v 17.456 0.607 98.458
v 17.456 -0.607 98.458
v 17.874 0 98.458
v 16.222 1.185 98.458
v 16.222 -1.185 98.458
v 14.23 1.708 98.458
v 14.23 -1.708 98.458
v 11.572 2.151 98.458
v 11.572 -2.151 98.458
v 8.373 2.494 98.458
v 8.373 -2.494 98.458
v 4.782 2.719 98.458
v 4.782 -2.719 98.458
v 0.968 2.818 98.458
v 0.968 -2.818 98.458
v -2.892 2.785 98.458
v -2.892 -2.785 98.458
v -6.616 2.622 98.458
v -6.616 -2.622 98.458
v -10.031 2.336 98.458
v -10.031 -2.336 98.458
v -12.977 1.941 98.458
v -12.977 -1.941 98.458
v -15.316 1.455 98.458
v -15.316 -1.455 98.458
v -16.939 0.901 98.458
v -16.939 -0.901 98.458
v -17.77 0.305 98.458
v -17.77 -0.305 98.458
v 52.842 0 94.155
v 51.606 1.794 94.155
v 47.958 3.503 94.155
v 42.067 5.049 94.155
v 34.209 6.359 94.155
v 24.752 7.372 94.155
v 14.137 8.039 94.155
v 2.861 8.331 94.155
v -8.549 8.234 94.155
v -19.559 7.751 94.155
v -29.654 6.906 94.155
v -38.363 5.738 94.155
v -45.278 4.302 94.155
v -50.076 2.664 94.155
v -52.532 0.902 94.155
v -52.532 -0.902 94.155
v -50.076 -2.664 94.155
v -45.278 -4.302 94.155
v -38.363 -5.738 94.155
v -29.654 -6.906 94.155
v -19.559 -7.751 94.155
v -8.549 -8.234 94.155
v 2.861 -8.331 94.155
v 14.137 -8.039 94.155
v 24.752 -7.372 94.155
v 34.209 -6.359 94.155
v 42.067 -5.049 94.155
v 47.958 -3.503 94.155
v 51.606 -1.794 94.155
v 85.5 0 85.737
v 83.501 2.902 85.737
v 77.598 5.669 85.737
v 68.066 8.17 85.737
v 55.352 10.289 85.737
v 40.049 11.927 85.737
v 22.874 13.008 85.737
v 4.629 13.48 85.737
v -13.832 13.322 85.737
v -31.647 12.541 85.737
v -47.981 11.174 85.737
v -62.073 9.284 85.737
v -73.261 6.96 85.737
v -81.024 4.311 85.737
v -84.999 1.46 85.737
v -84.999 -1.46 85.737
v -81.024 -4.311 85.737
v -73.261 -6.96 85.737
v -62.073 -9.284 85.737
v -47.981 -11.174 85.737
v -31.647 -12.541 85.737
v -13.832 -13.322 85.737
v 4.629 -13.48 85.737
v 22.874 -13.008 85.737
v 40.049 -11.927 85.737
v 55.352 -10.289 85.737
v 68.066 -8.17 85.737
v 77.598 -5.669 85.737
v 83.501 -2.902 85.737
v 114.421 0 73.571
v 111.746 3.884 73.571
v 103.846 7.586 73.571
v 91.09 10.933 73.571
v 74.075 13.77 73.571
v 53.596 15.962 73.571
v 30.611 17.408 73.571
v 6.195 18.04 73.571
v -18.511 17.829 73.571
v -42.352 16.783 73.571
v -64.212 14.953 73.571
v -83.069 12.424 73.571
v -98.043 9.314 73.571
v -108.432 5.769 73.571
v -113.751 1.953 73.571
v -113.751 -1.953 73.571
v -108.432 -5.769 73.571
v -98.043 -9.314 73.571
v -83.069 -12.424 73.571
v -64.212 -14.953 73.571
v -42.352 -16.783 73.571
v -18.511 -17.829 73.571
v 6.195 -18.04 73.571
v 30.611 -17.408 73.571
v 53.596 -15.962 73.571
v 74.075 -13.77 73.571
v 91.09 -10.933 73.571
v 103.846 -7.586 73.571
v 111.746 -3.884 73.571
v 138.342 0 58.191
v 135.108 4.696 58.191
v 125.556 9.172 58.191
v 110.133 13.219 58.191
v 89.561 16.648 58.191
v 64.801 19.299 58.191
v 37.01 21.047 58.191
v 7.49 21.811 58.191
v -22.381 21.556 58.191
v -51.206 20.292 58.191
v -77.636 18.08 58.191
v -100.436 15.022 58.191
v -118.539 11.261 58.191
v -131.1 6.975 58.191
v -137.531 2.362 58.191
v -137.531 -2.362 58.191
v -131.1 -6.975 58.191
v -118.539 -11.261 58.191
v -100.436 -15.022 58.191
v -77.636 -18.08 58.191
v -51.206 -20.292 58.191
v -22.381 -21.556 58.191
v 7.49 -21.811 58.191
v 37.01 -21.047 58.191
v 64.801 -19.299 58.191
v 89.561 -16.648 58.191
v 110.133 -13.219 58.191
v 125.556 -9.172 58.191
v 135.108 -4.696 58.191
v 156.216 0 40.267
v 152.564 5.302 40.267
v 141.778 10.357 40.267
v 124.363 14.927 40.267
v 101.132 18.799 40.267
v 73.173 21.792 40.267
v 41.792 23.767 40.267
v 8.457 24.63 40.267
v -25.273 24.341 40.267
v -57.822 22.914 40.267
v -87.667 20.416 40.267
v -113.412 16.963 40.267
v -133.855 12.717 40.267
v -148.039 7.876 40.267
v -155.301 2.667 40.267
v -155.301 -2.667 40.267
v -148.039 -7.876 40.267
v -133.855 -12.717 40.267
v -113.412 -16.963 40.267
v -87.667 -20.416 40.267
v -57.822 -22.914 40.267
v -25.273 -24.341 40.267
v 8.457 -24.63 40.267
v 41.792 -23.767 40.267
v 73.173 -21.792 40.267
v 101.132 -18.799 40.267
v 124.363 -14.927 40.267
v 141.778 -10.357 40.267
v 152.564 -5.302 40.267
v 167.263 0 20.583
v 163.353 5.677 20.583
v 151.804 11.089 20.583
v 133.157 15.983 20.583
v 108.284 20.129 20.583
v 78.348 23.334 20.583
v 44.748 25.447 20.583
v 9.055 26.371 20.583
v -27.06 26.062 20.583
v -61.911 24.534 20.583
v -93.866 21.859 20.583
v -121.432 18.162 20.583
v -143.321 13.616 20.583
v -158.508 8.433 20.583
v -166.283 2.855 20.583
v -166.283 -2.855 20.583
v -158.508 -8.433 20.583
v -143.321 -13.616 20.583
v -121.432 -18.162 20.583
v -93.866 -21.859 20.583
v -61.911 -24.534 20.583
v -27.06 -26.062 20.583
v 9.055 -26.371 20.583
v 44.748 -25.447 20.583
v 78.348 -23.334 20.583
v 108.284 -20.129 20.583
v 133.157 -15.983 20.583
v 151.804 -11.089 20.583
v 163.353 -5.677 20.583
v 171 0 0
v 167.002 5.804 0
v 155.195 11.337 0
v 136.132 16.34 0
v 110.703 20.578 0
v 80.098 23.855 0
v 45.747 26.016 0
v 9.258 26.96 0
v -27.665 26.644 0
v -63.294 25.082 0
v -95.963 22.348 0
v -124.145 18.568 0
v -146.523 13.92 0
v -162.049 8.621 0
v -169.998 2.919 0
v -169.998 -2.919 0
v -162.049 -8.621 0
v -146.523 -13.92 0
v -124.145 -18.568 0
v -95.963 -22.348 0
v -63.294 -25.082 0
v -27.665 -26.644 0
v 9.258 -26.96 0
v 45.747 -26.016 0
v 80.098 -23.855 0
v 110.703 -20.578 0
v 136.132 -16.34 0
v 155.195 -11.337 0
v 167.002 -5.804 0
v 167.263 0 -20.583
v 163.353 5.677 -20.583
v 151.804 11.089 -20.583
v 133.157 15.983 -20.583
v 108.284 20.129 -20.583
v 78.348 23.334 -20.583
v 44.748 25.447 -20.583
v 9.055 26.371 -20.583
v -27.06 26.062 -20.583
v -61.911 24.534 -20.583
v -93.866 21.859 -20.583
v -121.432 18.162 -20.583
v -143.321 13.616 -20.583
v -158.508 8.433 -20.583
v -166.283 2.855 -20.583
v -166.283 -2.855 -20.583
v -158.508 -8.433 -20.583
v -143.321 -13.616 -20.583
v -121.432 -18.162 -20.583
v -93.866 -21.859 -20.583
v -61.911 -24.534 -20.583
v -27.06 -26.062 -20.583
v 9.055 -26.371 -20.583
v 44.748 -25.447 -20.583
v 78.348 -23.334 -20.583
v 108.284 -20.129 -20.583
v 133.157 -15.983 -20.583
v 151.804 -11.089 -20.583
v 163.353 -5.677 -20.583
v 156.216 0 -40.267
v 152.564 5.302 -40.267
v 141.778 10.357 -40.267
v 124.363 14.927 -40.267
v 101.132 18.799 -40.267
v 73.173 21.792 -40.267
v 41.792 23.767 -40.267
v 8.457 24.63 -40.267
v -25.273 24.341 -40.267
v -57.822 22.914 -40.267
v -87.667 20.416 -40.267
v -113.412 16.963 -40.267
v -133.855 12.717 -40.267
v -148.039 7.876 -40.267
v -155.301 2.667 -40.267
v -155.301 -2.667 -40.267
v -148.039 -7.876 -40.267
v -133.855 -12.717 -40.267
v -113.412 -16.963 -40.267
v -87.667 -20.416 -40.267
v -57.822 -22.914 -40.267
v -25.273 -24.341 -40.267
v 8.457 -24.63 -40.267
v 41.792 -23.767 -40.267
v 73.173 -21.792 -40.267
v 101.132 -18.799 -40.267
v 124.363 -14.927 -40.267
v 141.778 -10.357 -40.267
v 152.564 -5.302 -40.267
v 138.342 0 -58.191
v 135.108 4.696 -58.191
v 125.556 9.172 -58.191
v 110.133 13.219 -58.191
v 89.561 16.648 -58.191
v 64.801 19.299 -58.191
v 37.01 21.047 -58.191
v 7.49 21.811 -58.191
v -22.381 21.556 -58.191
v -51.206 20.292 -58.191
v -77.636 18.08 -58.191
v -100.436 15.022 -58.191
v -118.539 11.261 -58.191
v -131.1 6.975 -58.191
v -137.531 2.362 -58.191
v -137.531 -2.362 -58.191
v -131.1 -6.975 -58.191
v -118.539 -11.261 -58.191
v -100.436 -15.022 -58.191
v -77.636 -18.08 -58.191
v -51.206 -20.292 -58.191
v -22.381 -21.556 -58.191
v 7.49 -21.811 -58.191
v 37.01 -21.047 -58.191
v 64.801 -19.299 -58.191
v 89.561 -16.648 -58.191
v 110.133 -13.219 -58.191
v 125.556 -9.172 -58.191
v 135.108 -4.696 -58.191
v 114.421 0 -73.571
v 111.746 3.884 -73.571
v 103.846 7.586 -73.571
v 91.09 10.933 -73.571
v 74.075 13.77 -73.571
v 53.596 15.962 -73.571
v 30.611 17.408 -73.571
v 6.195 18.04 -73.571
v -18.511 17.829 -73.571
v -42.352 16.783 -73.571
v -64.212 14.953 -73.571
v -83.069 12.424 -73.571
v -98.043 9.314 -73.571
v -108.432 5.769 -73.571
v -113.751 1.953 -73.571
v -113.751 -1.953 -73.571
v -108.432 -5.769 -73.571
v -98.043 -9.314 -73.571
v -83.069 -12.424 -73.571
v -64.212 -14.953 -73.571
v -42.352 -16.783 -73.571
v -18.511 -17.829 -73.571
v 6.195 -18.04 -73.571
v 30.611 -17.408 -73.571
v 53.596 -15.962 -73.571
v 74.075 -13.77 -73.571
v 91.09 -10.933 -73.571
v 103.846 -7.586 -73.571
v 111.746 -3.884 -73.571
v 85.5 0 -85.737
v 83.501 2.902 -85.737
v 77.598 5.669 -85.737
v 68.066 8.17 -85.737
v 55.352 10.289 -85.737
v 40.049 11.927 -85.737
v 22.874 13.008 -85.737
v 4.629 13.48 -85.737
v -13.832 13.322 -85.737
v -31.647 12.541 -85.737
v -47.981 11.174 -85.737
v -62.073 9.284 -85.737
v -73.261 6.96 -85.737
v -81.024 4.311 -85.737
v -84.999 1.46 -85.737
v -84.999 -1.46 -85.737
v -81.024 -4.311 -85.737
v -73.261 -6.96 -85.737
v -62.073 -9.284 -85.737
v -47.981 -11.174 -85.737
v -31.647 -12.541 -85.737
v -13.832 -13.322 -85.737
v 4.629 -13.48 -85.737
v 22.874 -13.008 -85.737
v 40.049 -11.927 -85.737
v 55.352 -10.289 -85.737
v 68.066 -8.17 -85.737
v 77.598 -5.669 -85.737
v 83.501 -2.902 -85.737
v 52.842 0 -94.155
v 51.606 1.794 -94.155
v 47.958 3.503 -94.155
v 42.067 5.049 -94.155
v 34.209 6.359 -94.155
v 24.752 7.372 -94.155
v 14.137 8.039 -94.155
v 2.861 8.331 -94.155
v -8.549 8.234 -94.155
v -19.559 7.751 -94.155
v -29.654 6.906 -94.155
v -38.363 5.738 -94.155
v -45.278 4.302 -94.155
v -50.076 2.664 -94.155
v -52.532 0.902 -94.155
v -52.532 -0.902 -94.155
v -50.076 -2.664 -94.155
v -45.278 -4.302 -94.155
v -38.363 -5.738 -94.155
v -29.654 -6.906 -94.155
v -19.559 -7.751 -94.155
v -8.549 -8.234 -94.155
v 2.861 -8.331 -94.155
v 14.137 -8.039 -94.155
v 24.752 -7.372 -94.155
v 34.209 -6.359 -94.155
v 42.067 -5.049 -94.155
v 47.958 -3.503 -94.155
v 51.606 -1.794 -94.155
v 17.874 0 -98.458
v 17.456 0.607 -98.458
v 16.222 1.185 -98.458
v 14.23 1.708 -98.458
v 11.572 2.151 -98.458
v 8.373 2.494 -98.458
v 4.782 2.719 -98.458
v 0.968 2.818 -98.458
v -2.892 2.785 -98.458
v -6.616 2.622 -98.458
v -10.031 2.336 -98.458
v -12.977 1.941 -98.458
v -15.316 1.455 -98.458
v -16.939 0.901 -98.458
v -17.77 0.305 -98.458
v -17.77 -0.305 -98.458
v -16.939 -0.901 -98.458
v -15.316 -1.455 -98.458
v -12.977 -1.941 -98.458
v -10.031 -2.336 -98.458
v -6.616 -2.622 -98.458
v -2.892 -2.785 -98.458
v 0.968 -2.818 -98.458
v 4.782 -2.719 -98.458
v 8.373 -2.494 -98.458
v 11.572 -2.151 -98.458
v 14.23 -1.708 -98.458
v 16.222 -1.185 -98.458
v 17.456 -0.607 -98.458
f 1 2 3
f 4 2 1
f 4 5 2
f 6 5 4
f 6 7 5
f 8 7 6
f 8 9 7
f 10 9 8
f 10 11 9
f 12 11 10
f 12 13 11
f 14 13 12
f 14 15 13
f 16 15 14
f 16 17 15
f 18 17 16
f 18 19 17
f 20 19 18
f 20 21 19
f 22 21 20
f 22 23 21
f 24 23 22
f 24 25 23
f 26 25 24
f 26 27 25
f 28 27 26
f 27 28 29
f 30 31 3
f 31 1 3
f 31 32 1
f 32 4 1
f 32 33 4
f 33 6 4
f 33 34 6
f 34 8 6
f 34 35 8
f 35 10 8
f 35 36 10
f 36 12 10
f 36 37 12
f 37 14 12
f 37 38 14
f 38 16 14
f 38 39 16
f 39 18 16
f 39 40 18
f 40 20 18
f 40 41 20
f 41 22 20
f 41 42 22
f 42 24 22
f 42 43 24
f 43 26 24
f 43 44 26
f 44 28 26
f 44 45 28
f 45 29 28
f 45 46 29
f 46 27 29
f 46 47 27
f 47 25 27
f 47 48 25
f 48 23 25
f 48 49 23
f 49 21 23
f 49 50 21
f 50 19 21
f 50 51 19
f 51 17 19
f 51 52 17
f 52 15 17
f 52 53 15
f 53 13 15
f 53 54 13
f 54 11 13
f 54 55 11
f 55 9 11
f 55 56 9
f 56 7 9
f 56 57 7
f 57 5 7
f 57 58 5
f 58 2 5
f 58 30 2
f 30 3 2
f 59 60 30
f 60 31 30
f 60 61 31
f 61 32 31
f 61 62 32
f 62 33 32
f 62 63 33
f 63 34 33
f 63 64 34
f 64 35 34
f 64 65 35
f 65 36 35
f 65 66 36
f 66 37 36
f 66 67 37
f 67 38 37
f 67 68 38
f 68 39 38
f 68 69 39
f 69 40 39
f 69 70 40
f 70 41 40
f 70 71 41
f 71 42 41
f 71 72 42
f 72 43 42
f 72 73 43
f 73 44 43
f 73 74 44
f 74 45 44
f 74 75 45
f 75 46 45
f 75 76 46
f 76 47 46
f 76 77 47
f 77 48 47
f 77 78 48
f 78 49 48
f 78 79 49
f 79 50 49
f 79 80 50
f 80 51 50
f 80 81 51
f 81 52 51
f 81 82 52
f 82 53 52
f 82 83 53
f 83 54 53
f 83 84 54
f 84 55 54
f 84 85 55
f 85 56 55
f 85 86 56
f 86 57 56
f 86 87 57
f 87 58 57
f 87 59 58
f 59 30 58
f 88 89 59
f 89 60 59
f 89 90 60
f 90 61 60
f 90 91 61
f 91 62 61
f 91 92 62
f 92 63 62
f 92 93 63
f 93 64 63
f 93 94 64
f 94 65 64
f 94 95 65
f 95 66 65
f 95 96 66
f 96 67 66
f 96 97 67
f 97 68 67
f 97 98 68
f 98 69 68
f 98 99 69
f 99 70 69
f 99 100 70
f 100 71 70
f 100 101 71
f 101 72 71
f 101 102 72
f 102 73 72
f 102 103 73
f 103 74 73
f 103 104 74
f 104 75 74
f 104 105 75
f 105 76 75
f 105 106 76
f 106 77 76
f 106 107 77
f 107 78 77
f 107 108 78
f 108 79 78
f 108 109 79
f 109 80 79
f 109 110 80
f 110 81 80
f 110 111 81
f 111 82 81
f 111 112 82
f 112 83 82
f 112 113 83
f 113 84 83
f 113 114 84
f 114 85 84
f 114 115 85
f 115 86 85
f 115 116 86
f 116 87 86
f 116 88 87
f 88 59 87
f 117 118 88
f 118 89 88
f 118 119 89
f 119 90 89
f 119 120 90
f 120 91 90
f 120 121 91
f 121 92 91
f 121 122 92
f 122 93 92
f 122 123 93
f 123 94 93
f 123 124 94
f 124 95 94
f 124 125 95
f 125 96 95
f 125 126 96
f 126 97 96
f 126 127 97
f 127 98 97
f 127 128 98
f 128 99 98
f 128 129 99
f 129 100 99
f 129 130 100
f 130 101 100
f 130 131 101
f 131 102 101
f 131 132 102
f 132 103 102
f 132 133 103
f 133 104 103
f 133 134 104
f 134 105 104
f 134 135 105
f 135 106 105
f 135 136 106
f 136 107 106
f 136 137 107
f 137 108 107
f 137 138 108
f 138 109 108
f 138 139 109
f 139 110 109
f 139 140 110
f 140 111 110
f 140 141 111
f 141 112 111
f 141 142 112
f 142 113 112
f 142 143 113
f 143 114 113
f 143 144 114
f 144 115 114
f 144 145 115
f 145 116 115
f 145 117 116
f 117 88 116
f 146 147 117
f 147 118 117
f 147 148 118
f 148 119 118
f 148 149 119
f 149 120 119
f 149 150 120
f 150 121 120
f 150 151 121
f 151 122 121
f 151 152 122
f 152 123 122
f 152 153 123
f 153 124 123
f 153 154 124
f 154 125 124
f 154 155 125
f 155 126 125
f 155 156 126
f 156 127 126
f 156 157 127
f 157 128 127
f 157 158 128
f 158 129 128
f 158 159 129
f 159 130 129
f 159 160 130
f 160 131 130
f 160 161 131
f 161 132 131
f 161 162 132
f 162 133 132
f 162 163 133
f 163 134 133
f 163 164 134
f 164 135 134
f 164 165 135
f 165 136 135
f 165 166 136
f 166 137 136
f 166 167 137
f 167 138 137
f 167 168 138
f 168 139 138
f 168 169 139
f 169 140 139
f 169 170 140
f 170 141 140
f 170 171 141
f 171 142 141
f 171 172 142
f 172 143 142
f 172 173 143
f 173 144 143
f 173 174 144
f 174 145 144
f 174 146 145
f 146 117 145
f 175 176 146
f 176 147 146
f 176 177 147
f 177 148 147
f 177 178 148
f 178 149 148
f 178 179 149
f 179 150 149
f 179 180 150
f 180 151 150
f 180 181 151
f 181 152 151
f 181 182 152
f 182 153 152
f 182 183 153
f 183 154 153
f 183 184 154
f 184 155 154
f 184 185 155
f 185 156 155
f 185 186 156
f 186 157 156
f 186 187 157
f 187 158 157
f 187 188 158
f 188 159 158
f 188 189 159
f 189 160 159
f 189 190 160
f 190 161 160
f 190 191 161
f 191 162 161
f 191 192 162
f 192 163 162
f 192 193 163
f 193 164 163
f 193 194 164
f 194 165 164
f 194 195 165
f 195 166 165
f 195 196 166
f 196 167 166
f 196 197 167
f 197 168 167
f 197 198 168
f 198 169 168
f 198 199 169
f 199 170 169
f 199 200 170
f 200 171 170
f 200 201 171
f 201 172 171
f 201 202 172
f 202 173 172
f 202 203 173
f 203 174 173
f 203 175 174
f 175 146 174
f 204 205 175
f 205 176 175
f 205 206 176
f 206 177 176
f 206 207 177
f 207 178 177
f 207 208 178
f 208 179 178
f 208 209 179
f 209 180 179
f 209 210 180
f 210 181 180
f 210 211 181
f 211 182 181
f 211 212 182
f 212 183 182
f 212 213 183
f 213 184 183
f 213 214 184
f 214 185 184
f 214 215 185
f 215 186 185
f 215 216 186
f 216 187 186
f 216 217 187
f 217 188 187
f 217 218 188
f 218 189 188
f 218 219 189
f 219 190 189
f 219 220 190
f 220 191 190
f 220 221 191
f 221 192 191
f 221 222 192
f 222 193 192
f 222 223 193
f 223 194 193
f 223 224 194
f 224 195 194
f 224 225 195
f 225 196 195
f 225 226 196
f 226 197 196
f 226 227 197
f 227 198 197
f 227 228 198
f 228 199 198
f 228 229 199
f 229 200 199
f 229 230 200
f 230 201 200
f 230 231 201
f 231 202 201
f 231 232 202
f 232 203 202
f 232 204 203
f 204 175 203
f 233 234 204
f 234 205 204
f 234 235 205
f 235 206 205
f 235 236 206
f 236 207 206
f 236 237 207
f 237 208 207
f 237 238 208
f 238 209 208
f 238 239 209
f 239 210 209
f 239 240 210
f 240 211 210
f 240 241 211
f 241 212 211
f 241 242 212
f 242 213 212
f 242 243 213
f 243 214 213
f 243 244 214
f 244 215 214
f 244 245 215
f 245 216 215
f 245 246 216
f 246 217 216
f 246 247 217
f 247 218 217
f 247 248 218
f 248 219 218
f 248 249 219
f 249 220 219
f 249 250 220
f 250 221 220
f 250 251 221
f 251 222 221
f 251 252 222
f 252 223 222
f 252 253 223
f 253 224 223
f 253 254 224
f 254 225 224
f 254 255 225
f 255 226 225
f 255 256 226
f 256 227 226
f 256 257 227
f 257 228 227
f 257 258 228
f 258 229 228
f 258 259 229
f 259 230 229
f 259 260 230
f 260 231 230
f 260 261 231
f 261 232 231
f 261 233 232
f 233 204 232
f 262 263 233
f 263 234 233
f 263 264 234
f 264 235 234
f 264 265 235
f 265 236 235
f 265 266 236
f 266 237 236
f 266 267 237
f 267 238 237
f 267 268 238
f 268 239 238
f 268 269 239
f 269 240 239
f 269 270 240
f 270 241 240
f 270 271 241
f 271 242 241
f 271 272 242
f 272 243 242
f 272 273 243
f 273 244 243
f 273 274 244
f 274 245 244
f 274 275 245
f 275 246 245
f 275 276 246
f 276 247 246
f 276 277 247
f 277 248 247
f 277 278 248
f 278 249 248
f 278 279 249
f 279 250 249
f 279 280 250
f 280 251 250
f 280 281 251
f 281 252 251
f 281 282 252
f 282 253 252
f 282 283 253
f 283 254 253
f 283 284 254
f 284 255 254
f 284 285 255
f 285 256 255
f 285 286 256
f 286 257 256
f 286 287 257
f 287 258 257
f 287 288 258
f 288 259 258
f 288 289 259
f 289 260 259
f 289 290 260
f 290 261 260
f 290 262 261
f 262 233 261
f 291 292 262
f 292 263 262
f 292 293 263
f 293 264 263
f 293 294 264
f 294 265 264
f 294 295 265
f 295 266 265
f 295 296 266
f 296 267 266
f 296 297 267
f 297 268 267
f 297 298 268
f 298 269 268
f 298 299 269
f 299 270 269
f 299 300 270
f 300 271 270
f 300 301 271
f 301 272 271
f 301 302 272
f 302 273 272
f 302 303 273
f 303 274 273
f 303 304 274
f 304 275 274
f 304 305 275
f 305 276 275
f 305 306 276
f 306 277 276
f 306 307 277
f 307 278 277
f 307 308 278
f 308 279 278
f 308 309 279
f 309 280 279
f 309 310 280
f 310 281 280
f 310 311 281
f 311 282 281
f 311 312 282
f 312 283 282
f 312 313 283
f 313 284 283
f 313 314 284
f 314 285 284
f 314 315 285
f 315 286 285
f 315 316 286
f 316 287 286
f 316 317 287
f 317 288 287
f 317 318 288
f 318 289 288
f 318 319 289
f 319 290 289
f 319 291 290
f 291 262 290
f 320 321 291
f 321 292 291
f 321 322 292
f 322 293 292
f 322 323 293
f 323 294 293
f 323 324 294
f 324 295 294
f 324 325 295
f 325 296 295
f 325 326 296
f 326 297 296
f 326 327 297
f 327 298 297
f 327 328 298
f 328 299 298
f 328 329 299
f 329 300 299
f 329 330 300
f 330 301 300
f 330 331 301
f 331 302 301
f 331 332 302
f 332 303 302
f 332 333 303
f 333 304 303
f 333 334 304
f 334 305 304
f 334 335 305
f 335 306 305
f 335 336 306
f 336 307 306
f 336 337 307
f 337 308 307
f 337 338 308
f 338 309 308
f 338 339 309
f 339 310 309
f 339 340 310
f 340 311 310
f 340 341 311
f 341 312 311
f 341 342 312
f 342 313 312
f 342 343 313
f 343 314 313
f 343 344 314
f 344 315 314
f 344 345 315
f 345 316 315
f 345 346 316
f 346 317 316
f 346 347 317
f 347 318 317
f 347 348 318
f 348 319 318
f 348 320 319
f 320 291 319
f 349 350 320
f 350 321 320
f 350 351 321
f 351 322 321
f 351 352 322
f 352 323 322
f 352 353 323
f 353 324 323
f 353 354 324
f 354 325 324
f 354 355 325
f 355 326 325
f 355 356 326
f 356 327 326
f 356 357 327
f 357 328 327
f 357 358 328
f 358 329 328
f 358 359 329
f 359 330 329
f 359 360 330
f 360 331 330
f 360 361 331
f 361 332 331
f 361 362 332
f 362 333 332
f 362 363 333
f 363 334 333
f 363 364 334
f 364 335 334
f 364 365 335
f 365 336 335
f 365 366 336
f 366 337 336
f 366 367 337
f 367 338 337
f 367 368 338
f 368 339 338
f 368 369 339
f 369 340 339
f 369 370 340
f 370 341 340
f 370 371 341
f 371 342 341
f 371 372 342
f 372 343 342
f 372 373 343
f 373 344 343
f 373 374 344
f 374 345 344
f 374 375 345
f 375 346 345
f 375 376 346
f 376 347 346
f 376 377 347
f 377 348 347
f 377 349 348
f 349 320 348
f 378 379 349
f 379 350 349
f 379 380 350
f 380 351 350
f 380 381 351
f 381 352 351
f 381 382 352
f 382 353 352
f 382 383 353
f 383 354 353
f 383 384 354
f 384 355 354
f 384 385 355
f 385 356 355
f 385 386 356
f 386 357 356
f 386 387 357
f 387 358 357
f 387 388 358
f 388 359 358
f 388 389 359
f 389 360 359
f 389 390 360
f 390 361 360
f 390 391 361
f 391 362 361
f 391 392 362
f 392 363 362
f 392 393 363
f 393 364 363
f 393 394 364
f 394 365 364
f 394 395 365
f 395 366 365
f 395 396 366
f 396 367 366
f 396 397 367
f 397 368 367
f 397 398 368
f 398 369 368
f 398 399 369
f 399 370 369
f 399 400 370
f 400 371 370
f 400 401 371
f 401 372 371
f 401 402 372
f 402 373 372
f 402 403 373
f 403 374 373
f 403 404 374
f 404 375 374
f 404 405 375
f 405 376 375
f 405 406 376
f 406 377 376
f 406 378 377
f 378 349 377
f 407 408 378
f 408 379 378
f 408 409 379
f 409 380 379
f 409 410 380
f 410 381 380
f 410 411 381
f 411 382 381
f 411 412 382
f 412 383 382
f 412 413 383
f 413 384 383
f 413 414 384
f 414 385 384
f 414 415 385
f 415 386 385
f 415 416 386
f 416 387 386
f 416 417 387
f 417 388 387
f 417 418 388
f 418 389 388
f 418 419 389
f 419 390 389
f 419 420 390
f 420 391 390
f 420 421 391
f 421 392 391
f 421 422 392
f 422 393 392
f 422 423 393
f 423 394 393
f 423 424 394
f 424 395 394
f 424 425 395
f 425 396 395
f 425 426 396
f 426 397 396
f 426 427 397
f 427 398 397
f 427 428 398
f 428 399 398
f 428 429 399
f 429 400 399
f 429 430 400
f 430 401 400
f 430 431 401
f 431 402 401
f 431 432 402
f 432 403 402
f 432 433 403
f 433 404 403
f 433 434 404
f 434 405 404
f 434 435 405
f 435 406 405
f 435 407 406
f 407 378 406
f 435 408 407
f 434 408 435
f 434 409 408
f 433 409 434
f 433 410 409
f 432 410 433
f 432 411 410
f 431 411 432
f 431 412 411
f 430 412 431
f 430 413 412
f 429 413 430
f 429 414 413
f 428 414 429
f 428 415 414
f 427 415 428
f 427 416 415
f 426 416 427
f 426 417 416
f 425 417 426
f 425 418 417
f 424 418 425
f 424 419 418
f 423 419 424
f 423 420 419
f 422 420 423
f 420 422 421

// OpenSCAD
// Generated by SolidPython 1.0.1 on 2020-07-29 00:46:53


scale(v = [19, 3, 11]) {
	sphere(r = 9);
}
/***********************************************
*********      SolidPython code:      **********
************************************************
 
# import packages: SolidPython
from solid import *
from solid.utils import *
from itertools import chain, combinations, permutations


class Resize:

    def __init__(self, scad_file):
        self.scad_file = scad_file
        #self.scad_file = import_scad(scad_file)
        # cone/cylinder param:
        self.r1 = 0
        self.r2 = 0
        self.h = 0
        # rectangular prism param:
        self.w = 0
        self.l = 0
        # ellipse param:
        self.r = 0

    # import OpenScad code (file name corresponds to shape)


    # classify shape + parameters
    def assign(self, param1, param2, param3):
        if self.scad_file == 'cone.scad':
            self.r1 = param1
            self.r2 = param2
            self.h = param3
        elif self.scad_file == 'cylinder.scad':
            self.r1 = param1
            self.r2 = param2
            self.h = param3
        elif self.scad_file == 'rectangularPrism.scad':
            self.h = param1
            self.l = param2
            self.w = param3
        else:
            self.r = param1
            self.h = param2

    # resize parameters
    def iterate(self):
        x = range(3, 20, 2)
        i = 1
        if self.scad_file == 'cone.scad':
            tempList = list(permutations(x, 2))
            for temp in tempList:
                param1 = temp[0]
                param2 = temp[1]
                filepath = 'produced_scad_files/' + 'cone' + str(param1) + '_' + str(param2) + '_' + '.scad'
                scad_render_to_file(cylinder(h=param1, r1=param2, r2=0), filepath)

        elif self.scad_file == 'cylinder.scad':
            tempList = list(permutations(x, 3))
            for temp in tempList:
                param1 = temp[0]
                param2 = temp[1]
                filepath = 'produced_scad_files/' + 'cylinder' + str(param1) + '_' + str(param2) + '_' + '.scad'
                scad_render_to_file(cylinder(h=param1, r1=param2, r2=param2), filepath)

        elif self.scad_file == 'rectangularPrism.scad':
            tempList = list(permutations(x, 3))
            for temp in tempList:
                param1 = temp[0]
                param2 = temp[1]
                param3 = temp[2]
                filepath = 'produced_scad_files/' + 'rectangularPrism' + str(param1) + '_' + str(param2) + '_' + str(
                    param3) + '.scad'
                scad_render_to_file(cube(size=(param1, param2, param3)), filepath)

        elif self.scad_file == 'ellipse.scad':
            tempList = list(permutations(x, 4))
            for temp in tempList:
                param1 = temp[0]
                param2 = temp[1]
                param3 = temp[2]
                param4 = temp[3]
                filepath = 'produced_scad_files/' + 'ellipse' + str(param1) + '_' + str(param2) + '_' + str(param3) + '_' + str(param4) + '.scad'
                scad_render_to_file(scale([param1, param2, param3])(sphere(r=param4)), filepath)

    def render_to_scadfile(self):
        scad_render_to_file(scad, 'example.scad') 
 
************************************************/
